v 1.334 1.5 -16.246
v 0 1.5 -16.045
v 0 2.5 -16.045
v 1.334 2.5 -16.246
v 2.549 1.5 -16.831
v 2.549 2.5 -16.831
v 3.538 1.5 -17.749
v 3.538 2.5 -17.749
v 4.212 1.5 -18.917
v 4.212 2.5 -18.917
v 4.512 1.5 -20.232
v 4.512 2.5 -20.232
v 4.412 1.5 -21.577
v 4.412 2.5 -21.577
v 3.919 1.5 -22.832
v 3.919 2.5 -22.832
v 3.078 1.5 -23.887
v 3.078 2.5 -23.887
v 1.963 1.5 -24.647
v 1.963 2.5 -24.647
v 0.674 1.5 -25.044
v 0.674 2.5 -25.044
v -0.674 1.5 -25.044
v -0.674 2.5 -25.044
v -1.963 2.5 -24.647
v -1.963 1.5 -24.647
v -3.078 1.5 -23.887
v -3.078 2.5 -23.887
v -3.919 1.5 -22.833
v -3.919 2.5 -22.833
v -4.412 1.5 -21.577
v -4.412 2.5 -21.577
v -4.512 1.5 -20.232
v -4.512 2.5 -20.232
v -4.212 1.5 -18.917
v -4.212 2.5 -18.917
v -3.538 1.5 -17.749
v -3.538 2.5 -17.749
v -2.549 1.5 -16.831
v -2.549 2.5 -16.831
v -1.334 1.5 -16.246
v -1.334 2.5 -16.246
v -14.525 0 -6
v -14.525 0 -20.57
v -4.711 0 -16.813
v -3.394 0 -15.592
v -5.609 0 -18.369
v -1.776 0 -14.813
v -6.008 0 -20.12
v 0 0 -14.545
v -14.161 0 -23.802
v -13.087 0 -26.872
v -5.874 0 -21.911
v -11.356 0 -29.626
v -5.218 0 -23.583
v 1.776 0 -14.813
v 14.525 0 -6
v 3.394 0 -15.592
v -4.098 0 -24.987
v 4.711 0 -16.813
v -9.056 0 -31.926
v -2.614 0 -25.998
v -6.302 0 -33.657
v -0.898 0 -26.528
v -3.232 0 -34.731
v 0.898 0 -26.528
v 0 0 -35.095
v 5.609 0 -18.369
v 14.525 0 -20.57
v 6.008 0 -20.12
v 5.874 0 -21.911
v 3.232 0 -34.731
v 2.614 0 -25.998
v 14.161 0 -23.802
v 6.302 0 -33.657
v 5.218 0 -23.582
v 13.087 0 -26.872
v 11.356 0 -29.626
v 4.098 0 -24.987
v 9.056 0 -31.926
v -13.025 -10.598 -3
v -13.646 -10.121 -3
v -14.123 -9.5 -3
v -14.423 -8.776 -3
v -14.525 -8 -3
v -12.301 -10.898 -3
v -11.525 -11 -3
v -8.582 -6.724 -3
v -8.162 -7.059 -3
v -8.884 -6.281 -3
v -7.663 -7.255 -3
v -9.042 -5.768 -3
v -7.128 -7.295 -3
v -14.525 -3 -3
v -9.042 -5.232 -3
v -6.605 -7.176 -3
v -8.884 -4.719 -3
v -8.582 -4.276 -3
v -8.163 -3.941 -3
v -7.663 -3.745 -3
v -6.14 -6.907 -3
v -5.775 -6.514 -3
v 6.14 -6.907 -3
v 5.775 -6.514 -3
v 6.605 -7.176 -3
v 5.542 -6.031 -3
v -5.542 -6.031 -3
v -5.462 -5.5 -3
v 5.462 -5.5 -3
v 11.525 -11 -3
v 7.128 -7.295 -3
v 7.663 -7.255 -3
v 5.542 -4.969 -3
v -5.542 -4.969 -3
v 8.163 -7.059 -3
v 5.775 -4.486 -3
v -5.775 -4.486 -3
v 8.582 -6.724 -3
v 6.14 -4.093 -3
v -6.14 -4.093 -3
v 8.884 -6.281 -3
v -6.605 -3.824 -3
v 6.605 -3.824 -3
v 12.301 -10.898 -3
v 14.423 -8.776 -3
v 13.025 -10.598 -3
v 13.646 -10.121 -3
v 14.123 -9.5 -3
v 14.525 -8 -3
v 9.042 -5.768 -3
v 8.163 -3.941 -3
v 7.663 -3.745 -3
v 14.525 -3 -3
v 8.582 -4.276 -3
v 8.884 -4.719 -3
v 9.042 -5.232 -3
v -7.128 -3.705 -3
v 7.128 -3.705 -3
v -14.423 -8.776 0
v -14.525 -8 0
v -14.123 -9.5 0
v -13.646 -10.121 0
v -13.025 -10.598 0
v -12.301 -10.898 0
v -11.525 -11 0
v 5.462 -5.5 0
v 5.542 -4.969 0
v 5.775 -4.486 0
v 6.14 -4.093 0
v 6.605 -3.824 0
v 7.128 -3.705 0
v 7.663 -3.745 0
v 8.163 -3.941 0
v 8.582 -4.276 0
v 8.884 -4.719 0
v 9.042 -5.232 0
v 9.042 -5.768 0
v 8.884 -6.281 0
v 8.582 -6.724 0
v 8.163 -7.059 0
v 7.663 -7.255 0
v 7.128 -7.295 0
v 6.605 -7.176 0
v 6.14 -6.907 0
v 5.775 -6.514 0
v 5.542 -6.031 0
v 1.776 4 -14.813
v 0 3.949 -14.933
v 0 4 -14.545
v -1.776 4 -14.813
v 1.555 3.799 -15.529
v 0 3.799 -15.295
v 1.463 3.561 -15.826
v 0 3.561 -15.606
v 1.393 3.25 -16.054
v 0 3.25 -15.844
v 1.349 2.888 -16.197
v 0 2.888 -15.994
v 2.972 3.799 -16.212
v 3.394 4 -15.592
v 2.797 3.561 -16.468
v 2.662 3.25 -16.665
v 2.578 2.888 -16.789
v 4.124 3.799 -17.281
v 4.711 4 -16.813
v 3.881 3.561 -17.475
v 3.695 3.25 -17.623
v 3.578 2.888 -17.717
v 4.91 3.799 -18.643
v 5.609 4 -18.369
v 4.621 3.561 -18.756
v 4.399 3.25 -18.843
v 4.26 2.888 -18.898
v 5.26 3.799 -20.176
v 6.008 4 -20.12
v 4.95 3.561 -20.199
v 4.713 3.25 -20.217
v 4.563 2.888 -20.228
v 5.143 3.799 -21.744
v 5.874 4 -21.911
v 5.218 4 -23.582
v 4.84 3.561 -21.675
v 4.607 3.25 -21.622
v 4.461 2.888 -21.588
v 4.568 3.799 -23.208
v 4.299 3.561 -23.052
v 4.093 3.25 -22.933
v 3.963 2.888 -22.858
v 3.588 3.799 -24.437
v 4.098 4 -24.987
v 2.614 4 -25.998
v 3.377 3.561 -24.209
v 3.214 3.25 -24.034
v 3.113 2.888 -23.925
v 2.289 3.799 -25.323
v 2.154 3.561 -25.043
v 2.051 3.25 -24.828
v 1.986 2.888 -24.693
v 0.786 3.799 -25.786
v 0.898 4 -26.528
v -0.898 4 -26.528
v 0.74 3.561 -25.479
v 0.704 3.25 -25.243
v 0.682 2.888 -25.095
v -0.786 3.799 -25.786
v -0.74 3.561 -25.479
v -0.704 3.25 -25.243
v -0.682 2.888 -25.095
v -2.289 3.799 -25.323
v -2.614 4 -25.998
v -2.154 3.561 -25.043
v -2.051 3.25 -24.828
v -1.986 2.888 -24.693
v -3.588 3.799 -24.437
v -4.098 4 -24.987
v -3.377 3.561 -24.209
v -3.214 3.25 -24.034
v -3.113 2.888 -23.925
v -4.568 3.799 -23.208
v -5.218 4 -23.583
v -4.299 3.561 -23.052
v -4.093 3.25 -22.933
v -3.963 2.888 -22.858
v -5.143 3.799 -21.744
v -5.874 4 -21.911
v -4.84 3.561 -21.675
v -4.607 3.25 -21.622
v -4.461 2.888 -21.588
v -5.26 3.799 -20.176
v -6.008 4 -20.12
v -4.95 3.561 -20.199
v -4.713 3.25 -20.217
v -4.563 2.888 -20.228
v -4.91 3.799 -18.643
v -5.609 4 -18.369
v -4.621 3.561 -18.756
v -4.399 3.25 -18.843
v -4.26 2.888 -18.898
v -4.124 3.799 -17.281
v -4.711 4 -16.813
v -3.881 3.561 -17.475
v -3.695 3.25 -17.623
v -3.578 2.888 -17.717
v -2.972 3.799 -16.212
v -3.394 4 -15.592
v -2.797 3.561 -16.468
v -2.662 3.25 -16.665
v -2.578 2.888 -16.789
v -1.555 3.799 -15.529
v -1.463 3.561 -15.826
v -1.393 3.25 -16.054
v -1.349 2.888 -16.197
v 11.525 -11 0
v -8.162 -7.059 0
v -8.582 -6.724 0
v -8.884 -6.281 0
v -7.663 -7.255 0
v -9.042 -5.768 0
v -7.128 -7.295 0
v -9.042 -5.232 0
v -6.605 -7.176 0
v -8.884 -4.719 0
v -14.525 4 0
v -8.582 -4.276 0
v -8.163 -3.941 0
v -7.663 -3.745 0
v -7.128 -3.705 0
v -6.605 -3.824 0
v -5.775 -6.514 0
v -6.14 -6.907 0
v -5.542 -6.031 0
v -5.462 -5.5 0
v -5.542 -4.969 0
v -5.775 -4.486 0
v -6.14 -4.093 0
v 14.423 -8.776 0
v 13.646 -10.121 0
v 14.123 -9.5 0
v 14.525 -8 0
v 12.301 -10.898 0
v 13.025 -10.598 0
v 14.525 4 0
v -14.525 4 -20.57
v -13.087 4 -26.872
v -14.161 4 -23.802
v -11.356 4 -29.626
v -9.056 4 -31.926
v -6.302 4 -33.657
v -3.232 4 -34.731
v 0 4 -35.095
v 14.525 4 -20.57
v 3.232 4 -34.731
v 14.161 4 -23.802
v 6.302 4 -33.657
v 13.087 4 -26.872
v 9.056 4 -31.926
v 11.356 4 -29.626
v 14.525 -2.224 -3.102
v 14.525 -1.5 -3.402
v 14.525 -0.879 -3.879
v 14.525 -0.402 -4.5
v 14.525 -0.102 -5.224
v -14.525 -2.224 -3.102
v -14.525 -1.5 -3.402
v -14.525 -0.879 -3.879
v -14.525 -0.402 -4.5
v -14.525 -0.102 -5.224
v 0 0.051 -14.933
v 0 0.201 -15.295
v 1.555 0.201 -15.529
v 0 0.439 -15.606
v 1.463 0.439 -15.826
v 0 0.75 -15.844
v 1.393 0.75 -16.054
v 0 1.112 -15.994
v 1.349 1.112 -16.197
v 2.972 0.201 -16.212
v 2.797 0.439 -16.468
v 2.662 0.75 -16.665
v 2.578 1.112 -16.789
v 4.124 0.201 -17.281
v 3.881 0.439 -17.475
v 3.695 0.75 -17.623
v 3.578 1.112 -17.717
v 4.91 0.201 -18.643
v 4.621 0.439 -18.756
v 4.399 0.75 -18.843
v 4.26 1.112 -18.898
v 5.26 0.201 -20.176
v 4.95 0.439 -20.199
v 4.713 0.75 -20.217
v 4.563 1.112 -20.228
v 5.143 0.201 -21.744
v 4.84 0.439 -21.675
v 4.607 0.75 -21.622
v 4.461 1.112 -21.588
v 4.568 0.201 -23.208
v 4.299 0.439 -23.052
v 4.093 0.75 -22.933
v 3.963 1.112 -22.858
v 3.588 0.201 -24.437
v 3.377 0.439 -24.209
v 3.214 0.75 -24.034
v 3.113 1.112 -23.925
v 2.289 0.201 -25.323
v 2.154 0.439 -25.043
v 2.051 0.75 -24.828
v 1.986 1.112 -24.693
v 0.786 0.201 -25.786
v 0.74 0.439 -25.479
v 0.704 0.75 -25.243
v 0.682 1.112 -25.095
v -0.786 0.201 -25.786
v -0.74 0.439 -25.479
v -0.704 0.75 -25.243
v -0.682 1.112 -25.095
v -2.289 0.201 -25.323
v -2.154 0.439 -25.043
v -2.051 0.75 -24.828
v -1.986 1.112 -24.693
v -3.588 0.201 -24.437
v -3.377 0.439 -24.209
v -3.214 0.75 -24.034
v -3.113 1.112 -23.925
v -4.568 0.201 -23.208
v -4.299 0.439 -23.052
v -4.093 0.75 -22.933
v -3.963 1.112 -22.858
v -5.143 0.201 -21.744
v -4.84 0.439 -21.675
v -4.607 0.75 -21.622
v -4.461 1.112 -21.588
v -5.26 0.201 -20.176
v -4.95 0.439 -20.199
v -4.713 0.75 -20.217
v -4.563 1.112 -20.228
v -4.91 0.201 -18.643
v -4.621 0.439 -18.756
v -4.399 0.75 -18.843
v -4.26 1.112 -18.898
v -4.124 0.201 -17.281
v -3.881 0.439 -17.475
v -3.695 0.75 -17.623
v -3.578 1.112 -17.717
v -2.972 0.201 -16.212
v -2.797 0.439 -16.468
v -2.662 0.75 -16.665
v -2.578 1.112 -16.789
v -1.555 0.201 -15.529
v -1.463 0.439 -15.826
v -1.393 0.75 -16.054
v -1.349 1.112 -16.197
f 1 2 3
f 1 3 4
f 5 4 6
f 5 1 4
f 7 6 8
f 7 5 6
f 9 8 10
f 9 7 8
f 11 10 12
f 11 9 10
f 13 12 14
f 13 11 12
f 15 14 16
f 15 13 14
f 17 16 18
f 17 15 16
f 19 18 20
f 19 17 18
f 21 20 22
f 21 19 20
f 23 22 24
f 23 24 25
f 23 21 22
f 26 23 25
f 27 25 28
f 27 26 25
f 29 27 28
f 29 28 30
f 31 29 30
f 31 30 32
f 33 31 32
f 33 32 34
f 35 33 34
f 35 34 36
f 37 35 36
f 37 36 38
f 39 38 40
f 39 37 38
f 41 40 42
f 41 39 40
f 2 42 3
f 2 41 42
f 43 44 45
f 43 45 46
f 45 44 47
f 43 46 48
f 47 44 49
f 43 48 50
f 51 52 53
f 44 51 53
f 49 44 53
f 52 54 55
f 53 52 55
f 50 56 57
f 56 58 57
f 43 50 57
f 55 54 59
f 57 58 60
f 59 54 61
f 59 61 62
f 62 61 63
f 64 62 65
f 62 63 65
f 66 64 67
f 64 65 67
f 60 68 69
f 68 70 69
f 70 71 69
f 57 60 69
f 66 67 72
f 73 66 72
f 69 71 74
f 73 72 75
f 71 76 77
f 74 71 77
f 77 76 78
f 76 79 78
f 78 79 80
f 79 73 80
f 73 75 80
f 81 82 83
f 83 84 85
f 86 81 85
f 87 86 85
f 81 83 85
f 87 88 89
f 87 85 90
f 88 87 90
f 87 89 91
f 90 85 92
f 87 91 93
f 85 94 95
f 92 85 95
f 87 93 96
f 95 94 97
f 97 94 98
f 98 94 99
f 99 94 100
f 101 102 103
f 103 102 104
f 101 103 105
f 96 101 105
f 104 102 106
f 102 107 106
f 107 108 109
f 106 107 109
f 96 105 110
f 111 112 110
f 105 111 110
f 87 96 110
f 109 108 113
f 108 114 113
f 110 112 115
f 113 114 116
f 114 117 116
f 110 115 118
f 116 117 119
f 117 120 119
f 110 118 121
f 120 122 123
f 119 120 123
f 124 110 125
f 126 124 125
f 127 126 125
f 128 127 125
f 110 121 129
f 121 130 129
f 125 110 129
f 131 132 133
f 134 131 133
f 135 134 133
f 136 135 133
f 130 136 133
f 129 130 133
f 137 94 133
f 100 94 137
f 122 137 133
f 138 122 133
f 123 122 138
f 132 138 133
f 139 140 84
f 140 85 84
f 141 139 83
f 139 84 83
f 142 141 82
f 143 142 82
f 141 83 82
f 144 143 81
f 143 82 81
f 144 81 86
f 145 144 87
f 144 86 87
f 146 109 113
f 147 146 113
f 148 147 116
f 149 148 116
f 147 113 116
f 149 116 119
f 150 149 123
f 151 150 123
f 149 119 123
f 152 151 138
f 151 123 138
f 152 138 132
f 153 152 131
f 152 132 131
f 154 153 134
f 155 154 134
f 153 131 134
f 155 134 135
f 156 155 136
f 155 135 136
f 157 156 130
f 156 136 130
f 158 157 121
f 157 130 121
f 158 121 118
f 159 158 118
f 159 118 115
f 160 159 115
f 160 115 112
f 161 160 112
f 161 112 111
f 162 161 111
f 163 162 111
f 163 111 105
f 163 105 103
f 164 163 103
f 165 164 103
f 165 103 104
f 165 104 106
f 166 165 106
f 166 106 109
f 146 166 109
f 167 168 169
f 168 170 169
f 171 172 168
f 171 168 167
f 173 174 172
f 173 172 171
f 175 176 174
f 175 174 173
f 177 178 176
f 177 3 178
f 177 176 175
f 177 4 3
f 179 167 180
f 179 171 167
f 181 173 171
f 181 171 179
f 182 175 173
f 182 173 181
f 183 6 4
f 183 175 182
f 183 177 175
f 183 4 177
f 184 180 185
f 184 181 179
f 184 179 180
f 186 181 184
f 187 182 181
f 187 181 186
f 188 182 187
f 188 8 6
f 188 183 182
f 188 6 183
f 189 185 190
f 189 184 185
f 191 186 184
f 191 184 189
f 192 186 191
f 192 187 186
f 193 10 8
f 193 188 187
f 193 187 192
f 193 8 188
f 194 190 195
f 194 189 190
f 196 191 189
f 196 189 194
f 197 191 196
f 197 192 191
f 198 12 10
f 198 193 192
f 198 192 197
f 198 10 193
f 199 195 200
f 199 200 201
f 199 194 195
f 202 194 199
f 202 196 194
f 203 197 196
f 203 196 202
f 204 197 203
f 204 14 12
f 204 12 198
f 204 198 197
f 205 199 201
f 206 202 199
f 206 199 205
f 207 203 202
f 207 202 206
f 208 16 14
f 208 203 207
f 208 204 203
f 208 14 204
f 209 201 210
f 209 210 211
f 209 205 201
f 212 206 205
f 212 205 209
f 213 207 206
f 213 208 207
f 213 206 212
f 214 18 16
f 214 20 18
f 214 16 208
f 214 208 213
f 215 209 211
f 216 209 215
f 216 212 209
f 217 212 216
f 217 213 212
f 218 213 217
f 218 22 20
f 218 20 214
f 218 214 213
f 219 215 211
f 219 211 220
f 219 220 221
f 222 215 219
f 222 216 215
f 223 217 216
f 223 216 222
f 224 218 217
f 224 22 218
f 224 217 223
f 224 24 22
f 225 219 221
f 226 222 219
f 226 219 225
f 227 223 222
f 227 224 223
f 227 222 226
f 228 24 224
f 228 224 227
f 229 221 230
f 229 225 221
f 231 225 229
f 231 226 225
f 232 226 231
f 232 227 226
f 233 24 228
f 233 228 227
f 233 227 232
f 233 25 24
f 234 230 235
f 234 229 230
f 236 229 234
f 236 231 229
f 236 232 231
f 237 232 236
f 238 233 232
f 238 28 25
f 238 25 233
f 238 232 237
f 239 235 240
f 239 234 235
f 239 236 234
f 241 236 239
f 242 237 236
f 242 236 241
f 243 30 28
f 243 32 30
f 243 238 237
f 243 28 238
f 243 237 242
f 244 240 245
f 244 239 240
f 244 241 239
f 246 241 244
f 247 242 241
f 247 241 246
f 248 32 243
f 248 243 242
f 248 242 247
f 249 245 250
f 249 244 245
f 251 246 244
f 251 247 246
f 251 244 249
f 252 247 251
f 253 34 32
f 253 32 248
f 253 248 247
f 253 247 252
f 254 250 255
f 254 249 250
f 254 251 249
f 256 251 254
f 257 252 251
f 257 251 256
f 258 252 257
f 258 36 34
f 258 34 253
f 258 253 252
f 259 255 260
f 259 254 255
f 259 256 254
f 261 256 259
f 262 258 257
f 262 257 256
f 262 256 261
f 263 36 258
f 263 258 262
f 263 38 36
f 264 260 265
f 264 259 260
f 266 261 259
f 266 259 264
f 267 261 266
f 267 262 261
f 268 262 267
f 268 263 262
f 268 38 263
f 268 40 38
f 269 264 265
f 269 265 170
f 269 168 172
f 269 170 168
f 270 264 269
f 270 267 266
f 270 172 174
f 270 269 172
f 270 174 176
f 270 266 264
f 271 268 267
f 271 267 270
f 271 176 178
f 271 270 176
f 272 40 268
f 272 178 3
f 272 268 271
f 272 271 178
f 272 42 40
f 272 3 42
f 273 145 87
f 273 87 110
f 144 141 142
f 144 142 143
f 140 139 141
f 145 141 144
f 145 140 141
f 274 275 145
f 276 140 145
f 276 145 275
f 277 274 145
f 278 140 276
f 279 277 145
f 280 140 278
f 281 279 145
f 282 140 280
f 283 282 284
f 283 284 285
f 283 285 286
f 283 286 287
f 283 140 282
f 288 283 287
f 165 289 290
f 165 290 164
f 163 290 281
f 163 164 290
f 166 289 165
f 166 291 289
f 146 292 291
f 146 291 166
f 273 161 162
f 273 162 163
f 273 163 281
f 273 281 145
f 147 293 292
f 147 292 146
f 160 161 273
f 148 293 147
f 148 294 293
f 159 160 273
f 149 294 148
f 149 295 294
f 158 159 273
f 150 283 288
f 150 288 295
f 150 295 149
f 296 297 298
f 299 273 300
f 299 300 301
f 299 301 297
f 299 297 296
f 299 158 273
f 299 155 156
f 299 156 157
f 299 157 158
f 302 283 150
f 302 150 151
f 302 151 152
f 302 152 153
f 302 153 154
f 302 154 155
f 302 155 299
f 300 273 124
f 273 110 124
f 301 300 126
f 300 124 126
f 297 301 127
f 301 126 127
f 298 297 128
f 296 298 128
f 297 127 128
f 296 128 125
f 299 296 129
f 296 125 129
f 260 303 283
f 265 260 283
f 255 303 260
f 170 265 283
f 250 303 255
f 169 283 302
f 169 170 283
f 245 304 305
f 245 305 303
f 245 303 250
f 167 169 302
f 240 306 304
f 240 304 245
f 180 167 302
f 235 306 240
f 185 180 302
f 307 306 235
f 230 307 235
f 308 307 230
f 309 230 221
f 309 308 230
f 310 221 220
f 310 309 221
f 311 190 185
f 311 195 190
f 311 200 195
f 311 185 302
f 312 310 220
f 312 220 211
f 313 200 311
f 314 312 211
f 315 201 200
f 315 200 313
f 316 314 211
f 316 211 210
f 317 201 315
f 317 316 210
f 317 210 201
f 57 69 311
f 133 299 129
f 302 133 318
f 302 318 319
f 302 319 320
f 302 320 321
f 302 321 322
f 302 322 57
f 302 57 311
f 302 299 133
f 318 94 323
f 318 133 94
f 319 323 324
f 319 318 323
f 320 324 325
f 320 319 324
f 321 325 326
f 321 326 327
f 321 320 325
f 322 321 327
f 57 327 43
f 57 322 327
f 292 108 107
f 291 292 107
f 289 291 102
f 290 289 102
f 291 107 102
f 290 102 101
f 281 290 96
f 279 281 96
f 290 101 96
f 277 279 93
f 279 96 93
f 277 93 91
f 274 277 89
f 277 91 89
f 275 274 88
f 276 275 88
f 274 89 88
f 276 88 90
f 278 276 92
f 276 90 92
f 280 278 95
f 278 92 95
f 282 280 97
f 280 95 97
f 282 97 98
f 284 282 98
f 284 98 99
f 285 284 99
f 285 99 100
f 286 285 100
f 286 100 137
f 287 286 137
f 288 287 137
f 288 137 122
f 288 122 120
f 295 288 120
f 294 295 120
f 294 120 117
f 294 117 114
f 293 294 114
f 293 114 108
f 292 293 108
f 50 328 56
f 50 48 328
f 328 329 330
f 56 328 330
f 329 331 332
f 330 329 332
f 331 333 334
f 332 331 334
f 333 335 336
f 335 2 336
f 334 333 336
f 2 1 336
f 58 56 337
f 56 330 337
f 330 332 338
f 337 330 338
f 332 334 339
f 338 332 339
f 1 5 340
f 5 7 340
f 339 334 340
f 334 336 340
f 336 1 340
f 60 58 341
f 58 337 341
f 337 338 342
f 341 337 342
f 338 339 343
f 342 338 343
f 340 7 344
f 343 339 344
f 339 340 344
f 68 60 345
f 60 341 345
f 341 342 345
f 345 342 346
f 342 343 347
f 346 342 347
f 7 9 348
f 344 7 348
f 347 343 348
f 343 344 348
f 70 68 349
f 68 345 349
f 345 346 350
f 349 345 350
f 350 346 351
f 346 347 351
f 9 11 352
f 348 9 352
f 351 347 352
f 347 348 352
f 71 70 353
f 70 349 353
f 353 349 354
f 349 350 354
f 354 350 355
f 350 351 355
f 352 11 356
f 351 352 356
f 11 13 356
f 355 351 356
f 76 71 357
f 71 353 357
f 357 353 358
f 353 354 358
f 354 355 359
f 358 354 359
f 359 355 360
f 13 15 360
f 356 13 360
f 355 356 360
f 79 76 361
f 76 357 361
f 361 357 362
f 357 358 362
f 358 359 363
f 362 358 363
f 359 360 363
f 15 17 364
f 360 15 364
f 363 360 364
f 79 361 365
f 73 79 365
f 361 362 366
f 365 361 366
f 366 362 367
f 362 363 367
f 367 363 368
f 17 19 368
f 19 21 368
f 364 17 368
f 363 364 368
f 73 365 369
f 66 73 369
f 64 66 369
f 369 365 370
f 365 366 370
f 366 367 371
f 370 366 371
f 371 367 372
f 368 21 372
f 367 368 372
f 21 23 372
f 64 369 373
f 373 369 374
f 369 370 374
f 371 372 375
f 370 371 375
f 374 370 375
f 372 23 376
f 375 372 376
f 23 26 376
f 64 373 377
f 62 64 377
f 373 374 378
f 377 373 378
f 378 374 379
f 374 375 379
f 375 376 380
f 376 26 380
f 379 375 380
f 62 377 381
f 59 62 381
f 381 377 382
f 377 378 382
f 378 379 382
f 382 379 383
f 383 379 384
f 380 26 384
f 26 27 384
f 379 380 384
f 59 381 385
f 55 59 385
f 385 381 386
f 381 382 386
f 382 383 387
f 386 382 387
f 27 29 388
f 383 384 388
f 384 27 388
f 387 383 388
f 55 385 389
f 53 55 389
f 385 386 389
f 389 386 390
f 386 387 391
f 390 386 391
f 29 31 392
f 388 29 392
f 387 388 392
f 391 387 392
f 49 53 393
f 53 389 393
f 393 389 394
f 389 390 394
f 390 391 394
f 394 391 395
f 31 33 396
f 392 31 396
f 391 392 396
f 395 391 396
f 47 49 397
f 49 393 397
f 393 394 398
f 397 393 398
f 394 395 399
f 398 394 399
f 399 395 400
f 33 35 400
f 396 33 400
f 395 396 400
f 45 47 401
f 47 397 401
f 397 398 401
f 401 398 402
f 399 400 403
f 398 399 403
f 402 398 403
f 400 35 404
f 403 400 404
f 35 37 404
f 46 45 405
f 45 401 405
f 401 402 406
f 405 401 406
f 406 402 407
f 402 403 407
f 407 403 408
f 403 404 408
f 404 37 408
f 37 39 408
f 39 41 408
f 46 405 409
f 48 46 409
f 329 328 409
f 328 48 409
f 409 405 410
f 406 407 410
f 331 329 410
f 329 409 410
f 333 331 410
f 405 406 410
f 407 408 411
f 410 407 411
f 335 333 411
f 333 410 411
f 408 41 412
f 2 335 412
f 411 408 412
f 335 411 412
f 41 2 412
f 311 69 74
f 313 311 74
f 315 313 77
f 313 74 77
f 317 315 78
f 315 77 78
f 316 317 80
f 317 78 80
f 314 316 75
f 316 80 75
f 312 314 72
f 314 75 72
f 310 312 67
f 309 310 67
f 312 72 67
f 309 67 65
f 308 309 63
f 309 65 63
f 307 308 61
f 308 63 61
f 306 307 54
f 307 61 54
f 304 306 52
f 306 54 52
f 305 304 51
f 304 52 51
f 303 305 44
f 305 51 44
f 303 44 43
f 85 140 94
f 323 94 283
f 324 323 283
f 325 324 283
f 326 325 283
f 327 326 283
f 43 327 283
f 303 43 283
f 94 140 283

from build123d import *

# Parameters (mm, degrees)
SKETCH1_R           = 4.525
BOSS_EXTRUDE1_DEPTH = 4
SKETCH2_W           = 29.05
SKETCH2_H           = 15
BOSS_EXTRUDE2_DEPTH = 3
SKETCH3_R           = 1.8
CUT_EXTRUDE1_DEPTH  = 37.906160055
FILLET1_R           = 3
FILLET2_R           = 1.5


with BuildPart() as part:
    # Sketch1 → Boss-Extrude1 (new body)
    with BuildSketch(Plane(origin=(0, 0, 0), x_dir=(1, 0, 0), z_dir=(0, 1, 0))):
        with BuildLine():
            Line((-14.525, 20.57), (-14.525, 0))
            Line((-14.525, 0), (14.525, 0))
            Line((14.525, 0), (14.525, 20.57))
            ThreePointArc((14.525, 20.57), (0, 35.095), (-14.525, 20.57))
        make_face()
        with Locations(Location((0, 20.57, 0), (0, 0, 270))):
            Circle(SKETCH1_R, mode=Mode.SUBTRACT)
    extrude(amount=BOSS_EXTRUDE1_DEPTH)

    # Sketch2 → Boss-Extrude2 (add)
    with BuildSketch(Plane.XY):
        with Locations((0, -3.5)):
            Rectangle(SKETCH2_W, SKETCH2_H)
    extrude(amount=-BOSS_EXTRUDE2_DEPTH)

    # Sketch3 → Cut-Extrude1 (cut, through all)
    with BuildSketch(Plane(origin=(0, 0, -3), x_dir=(-1, 0, 0), z_dir=(0, 0, -1))):
        with Locations((-7.2625, -5.5)):
            Circle(SKETCH3_R)
        with Locations(Location((7.2625, -5.5, 0), (0, 0, 180))):
            Circle(SKETCH3_R)
    extrude(amount=-CUT_EXTRUDE1_DEPTH, mode=Mode.SUBTRACT)

    # Fillet1
    fillet1_edges = [part.edges().sort_by_distance(p)[0] for p in [
        (-14.525, -11, -1.5),
        (0, 0, -3),
        (14.525, -11, -1.5),
    ]]
    fillet(fillet1_edges, radius=FILLET1_R)

    # Fillet2
    fillet2_edges = [part.edges().sort_by_distance(p)[0] for p in [
        (0, 0, -25.095),
        (0, 4, -25.095),
    ]]
    fillet(fillet2_edges, radius=FILLET2_R)


solid = part.part
